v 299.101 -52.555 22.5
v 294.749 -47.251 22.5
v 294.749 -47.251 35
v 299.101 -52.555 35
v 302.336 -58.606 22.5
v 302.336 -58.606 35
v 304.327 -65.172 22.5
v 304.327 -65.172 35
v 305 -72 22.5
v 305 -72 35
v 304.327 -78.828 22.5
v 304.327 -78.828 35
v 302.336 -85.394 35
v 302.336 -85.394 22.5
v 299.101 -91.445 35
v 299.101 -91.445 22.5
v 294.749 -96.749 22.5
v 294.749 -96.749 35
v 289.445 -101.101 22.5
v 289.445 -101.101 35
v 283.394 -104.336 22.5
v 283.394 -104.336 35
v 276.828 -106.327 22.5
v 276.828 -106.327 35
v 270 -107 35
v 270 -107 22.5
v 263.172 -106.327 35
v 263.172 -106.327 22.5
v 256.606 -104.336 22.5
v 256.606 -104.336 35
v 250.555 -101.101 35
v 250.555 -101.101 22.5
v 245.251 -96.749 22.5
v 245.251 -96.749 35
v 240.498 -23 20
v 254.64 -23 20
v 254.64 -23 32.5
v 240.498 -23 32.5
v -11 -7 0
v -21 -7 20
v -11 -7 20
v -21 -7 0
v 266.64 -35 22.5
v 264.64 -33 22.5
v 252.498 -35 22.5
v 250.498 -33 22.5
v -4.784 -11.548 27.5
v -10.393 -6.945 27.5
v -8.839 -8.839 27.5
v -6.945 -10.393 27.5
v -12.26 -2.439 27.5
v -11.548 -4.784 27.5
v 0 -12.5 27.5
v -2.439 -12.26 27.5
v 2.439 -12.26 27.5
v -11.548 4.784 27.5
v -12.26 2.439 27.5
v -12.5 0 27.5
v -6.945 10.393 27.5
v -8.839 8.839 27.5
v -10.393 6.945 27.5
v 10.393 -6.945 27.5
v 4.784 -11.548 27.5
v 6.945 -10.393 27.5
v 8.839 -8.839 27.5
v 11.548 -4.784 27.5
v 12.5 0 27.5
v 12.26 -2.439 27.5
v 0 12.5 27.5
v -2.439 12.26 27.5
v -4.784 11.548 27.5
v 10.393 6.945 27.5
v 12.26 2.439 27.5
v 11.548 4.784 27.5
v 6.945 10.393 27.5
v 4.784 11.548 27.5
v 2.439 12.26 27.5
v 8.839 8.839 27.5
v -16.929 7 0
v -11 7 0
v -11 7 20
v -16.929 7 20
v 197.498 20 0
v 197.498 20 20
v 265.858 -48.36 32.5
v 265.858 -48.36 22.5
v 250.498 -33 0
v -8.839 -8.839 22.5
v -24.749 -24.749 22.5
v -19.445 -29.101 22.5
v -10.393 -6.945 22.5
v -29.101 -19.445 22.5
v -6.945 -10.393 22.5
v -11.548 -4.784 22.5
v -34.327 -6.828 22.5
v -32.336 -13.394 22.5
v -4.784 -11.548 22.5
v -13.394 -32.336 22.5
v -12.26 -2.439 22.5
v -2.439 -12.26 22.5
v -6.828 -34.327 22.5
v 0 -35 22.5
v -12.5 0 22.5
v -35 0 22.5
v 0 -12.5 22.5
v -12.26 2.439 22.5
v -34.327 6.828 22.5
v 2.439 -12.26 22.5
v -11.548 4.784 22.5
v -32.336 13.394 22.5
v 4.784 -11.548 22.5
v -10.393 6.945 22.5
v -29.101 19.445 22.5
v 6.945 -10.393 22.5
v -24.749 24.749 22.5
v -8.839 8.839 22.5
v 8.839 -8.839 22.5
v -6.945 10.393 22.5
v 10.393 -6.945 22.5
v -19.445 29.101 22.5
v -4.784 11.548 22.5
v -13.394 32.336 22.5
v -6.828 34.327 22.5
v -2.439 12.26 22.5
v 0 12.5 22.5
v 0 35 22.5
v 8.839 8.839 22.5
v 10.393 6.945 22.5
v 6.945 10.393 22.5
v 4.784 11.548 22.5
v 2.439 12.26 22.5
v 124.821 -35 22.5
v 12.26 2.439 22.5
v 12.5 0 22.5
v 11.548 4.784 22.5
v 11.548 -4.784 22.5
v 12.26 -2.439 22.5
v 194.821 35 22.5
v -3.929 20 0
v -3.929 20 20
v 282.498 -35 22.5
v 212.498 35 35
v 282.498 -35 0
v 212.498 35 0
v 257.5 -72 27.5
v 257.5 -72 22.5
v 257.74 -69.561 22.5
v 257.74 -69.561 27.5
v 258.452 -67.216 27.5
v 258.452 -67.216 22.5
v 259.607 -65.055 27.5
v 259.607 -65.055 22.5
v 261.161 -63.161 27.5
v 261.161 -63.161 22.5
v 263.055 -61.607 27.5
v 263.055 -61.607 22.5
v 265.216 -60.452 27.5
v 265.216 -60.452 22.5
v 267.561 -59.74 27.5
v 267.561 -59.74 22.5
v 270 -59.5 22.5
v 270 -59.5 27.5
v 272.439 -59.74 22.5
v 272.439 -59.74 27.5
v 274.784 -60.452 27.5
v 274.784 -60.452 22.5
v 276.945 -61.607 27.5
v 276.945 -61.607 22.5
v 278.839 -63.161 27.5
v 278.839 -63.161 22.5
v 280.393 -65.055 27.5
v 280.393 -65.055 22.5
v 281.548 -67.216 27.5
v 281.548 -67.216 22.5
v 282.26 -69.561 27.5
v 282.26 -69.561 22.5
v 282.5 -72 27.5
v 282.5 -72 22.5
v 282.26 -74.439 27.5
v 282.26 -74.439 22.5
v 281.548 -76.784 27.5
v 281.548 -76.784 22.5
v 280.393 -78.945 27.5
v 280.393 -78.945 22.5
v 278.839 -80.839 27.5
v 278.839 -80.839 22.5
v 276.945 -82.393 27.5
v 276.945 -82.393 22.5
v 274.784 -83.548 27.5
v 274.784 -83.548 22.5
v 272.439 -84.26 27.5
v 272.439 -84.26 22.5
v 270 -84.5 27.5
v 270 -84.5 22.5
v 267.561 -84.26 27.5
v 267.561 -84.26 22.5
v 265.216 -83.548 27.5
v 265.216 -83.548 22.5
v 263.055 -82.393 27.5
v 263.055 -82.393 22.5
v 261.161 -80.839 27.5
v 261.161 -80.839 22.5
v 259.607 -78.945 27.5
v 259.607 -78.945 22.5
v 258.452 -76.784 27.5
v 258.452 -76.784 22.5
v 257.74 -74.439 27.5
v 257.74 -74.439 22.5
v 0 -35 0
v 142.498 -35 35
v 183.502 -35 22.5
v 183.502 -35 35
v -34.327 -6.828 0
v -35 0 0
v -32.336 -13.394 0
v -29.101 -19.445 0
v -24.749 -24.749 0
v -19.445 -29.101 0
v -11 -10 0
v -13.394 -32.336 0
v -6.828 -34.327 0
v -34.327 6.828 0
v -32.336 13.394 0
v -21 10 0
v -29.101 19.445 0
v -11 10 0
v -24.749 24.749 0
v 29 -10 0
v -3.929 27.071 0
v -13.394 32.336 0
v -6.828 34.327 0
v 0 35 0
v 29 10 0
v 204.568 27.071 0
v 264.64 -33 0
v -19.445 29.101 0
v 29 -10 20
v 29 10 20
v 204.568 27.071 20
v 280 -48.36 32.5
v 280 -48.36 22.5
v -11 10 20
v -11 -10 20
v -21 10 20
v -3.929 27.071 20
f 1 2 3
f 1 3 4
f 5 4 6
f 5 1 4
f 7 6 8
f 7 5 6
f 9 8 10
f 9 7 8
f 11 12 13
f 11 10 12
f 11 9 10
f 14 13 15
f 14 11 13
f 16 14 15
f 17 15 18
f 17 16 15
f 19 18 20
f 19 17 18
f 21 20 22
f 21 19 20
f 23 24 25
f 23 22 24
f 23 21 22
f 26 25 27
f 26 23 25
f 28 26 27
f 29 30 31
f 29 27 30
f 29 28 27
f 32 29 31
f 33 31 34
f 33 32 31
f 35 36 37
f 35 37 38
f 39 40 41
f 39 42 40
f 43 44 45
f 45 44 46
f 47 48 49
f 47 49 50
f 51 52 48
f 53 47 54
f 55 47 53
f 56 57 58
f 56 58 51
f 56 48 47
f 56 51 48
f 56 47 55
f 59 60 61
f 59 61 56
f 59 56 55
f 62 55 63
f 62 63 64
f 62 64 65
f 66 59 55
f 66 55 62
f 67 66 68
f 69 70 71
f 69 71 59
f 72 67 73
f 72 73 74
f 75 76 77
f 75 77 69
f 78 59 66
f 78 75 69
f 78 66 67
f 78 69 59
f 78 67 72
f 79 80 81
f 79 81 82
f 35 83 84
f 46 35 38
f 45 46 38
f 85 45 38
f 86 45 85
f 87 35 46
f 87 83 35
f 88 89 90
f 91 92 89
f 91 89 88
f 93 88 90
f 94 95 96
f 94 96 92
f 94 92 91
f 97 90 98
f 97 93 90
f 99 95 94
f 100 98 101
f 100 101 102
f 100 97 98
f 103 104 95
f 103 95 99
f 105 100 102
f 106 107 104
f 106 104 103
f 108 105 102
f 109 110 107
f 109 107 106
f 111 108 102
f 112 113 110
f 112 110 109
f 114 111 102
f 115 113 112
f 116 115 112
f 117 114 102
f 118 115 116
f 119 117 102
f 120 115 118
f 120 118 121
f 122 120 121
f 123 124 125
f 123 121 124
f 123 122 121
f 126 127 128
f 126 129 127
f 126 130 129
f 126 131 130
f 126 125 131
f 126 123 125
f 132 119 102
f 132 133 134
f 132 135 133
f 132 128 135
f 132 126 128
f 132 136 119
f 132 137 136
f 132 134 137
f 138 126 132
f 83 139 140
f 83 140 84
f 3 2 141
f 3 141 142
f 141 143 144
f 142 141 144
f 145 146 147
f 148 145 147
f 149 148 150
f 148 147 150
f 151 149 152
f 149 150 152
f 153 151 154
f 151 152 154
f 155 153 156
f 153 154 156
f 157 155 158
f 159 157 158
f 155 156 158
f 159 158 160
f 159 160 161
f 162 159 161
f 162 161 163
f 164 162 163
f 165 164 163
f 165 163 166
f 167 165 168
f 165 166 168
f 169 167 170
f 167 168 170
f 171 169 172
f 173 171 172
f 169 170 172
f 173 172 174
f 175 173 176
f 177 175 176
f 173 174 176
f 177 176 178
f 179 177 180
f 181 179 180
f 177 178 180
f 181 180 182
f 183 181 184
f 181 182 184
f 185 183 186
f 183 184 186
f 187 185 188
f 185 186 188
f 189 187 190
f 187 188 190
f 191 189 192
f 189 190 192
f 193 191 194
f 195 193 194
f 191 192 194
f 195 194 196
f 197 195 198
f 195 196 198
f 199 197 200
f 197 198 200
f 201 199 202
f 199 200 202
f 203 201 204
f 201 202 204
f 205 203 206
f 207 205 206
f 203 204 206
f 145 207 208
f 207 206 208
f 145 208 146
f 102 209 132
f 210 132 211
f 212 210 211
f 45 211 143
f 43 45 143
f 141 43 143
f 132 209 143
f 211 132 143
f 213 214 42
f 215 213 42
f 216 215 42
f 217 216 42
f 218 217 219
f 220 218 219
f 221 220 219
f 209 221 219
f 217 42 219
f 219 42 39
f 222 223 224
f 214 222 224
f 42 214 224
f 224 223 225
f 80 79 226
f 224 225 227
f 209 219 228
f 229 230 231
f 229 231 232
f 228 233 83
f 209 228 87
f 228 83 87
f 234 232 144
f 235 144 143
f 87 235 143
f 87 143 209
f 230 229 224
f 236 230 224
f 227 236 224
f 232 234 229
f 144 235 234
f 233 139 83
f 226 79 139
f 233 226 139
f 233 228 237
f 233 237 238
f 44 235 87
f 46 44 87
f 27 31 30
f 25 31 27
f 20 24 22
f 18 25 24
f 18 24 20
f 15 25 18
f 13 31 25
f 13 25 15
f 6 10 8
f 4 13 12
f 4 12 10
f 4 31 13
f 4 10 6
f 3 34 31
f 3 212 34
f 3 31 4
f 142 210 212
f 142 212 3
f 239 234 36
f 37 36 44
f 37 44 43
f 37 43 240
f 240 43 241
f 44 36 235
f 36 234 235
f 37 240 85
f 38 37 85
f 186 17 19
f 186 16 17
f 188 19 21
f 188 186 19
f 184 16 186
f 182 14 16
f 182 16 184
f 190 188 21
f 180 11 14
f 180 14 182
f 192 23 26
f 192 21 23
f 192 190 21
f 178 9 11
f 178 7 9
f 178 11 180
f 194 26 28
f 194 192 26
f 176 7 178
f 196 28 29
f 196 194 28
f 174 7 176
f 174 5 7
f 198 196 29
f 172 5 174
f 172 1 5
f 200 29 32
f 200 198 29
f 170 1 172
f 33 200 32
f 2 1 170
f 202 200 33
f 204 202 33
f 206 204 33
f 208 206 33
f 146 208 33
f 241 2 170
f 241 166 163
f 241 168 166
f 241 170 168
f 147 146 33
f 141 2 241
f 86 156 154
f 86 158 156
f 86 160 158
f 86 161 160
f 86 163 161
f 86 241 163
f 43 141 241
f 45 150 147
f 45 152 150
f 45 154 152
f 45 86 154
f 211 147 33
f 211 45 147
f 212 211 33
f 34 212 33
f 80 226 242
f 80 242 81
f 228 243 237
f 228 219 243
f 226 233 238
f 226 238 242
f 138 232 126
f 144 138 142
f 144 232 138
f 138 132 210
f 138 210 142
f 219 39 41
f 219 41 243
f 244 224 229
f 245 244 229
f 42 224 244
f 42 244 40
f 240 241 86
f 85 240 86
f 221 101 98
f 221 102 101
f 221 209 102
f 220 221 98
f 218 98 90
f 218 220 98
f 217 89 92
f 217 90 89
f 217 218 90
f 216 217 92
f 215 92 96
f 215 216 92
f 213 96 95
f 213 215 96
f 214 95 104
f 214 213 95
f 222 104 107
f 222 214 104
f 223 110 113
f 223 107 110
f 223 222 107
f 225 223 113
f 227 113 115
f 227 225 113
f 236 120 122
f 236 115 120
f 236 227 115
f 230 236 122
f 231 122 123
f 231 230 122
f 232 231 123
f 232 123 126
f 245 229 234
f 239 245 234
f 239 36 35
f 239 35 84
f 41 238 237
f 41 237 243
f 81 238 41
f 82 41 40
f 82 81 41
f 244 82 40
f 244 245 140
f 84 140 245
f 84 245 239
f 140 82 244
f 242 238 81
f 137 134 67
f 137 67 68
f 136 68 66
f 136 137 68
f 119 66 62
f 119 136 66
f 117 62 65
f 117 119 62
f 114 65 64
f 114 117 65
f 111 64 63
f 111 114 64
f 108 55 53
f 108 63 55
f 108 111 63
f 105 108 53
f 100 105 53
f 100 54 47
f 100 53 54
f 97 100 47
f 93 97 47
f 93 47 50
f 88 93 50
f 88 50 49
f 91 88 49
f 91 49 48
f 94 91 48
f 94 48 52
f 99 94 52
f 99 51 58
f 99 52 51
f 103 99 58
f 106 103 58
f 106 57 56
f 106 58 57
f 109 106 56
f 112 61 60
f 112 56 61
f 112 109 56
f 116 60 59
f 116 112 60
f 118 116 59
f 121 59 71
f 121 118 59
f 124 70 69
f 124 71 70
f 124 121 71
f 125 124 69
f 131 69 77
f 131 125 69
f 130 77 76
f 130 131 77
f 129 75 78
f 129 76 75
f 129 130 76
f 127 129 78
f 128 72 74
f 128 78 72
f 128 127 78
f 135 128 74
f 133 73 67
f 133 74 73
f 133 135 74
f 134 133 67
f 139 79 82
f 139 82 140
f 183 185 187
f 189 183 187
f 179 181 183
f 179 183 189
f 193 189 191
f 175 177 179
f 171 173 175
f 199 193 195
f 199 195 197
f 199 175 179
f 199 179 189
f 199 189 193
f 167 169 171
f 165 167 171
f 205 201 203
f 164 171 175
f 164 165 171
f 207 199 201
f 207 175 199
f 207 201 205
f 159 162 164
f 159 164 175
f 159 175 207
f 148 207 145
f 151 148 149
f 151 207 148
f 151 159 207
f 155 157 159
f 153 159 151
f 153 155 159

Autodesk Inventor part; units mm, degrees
ref_plane "YZ Plane" through (0, 0, 0) normal (1, 0, 0) x (0, 1, 0)
ref_plane "XZ Plane" through (0, 0, 0) normal (0, 1, 0) x (-1, 0, 0)
ref_plane "XY Plane" through (0, 0, 0) normal (0, 0, 1) x (1, 0, 0)
sketch "Sketch1" plane through (0, 0, 0) normal (0, 0, 1) x (1, 0, 0)
  circle A0 centre (0, 0) radius 35
  line L0 (0, 35) -> (212.4975, 35)
  line L1 (212.4975, 35) -> (294.7487, -47.2513)
  circle A1 centre (270, -72) radius 35
  line L2 (0, -35) -> (183.5025, -35)
  line L3 (183.5025, -35) -> (245.2513, -96.7487)
  dimension "d0" = 70
  dimension "d1" = 135
  dimension "d2" = 70
  dimension "d3" = 37
  dimension "d4" = 270
extrude "Extrusion1" add sketch "Sketch1" along normal blind 22.5
sketch "Sketch2" plane through (0, 0, 22.5) normal (0, 0, 1) x (1, 0, 0)
  line L0 (294.7487, -47.2513) -> (212.4975, 35) projected
  line L1 (212.4975, 35) -> (142.4975, -35)
  line L2 (0, -35) -> (183.5025, -35) projected
  arc A0 (245.2513, -96.7487) -> (294.7487, -47.2513) centre (270, -72) ccw projected
  line L3 (294.7487, -47.2513) -> (212.4975, 35) projected
  line L4 (212.4975, 35) -> (0, 35) projected
  arc A1 (0, 35) -> (0, -35) centre (0, 0) ccw projected
  line L5 (0, -35) -> (183.5025, -35) projected
  line L6 (183.5025, -35) -> (245.2513, -96.7487) projected
  line L7 (142.4975, -35) -> (183.5025, -35)
  dimension "d7" = 45
extrude "Extrusion2" add sketch "Sketch2" along normal blind 12.5 contours A0 L6 L2 L1 L0
chamfer "Chamfer1" distance 12.5 angle 45 1 edges at (177.4975, 0, 22.5)
sketch "Sketch3" plane through (0, 0, 0) normal (0, 0, -1) x (-1, 0, 0)
  line L0 (-29, 10) -> (11, 10)
  line L1 (11, 10) -> (11, -10)
  line L2 (11, -10) -> (-29, -10)
  line L3 (-29, -10) -> (-29, 10)
  line L4 (11, 7) -> (21, 7)
  line L5 (21, 7) -> (21, -7)
  line L6 (21, -7) -> (11, -7)
  line L7 (11, -7) -> (11, 7)
  line L8 (21, 7) -> (21, 10)
  line L9 (21, 10) -> (3.9289, 27.0711)
  line L10 (16.9289, 7) -> (3.9289, 20)
  line L11 (-212.4975, 35) -> (0, 35) projected
  line L12 (3.9289, 20) -> (3.9289, 27.0711) construction
  line L13 (3.9289, 27.0711) -> (-204.5685, 27.0711)
  line L14 (3.9289, 20) -> (-197.4975, 20)
  line L15 (-212.4975, 35) -> (-142.4975, -35) construction
  line L16 (-204.5685, 27.0711) -> (-264.6396, -33)
  line L17 (-204.5685, 27.0711) -> (-130.9289, 27.0711) construction
  line L18 (-197.4975, 20) -> (-250.4975, -33)
  line L19 (-294.7487, -47.2513) -> (-212.4975, 35) projected
  line L20 (0, -35) -> (-183.5025, -35) projected
  line L21 (-264.6396, -33) -> (-250.4975, -33)
  point P0 (0, 0)
  point P1 (-194.8198, 35)
  dimension "d13" = 40
  dimension "d14" = 20
  dimension "d15" = 10
  dimension "d16" = 29
  dimension "d17" = 3
  dimension "d18" = 3
  dimension "d19" = 10
  dimension "d22" = 135
  dimension "d23" = 3
  dimension "d24" = 10
  dimension "d25" = 5
  dimension "d26" = 10
  dimension "d29" = 135
  dimension "d35" = 2
sketch "Sketch4" plane through (0, 0, 0) normal (0, 0, -1) x (-1, 0, 0)
  line L0 (-142.4975, -35) -> (-183.5025, -35) projected
  line L1 (-183.5025, -35) -> (-282.4975, -35)
  line L2 (-294.7487, -47.2513) -> (-212.4975, 35) projected
  line L3 (0, -35) -> (-183.5025, -35) projected
  arc A0 (-294.7487, -47.2513) -> (-245.2513, -96.7487) centre (-270, -72) ccw projected
  line L4 (-183.5025, -35) -> (-245.2513, -96.7487) projected
  line L5 (0, -35) -> (-183.5025, -35) projected
  arc A1 (0, -35) -> (0, 35) centre (0, 0) ccw projected
  line L6 (-212.4975, 35) -> (0, 35) projected
  line L7 (-294.7487, -47.2513) -> (-212.4975, 35) projected
  line L8 (-282.4975, -35) -> (-294.7487, -47.2513)
extrude "Extrusion3" cut sketch "Sketch4" against normal blind 22.5 contours L4 A0 L2 L1
extrude "Extrusion4" cut sketch "Sketch3" against normal blind 20
sketch "Sketch5" plane through (0, 0, 22.5) normal (0, 0, 1) x (1, 0, 0)
  circle A0 centre (0, 0) radius 12.5
  dimension "d30" = 25
extrude "Extrusion5" add sketch "Sketch5" along normal blind 5
sketch "Sketch6" plane through (0, 0, 20) normal (0, 0, -1) x (-1, 0, 0)
  line L0 (11, 7) -> (16.9289, 7) projected
  line L1 (11, 10) -> (11, 7) projected
  line L2 (-29, 10) -> (11, 10) projected
  line L3 (-29, -10) -> (-29, 10) projected
  line L4 (11, -10) -> (-29, -10) projected
  line L5 (11, -7) -> (11, -10) projected
  line L6 (21, -7) -> (11, -7) projected
  line L7 (21, 10) -> (21, -7) projected
  line L8 (3.9289, 27.0711) -> (21, 10) projected
  line L9 (-204.5685, 27.0711) -> (3.9289, 27.0711) projected
  line L10 (-264.6396, -33) -> (-204.5685, 27.0711) projected
  line L11 (-250.4975, -33) -> (-264.6396, -33) projected
  line L12 (-197.4975, 20) -> (-250.4975, -33) projected
  line L13 (3.9289, 20) -> (-197.4975, 20) projected
  line L14 (16.9289, 7) -> (3.9289, 20) projected
  line L15 (-264.6396, -33) -> (-204.5685, 27.0711) projected
  line L16 (-254.6396, -23) -> (-240.4975, -23)
  line L17 (-197.4975, 20) -> (-250.4975, -33) projected
  point P0 (0, 0)
  dimension "d36" = 10
extrude "Extrusion6" cut sketch "Sketch6" against normal up to surface (2.5 mm away) contours L12 L11 L10 L16
sketch "Sketch7" plane through (0, 0, 22.5) normal (0, 0, -1) x (-1, 0, 0)
  line L0 (-254.6396, -23) -> (-240.4975, -23) projected
  line L1 (-264.6396, -33) -> (-254.6396, -23) projected
  line L2 (-250.4975, -33) -> (-264.6396, -33) projected
  line L3 (-240.4975, -23) -> (-250.4975, -33) projected
  line L4 (-264.6396, -33) -> (-280, -48.3604)
  line L5 (-280, -48.3604) -> (-265.8579, -48.3604)
  line L6 (-265.8579, -48.3604) -> (-250.4975, -33)
  point P0 (0, 0)
extrude "Extrusion7" cut sketch "Sketch7" against normal blind 10
sketch "Sketch8" plane through (0, 0, 22.5) normal (0, 0, -1) x (-1, 0, 0)
  arc A0 (-294.7487, -47.2513) -> (-245.2513, -96.7487) centre (-270, -72) ccw projected
  circle A1 centre (-270, -72) radius 12.5
  point P0 (0, 0)
  dimension "d41" = 25
extrude "Extrusion8" cut sketch "Sketch8" against normal blind 5
properties part number "arm 1 leftt"
